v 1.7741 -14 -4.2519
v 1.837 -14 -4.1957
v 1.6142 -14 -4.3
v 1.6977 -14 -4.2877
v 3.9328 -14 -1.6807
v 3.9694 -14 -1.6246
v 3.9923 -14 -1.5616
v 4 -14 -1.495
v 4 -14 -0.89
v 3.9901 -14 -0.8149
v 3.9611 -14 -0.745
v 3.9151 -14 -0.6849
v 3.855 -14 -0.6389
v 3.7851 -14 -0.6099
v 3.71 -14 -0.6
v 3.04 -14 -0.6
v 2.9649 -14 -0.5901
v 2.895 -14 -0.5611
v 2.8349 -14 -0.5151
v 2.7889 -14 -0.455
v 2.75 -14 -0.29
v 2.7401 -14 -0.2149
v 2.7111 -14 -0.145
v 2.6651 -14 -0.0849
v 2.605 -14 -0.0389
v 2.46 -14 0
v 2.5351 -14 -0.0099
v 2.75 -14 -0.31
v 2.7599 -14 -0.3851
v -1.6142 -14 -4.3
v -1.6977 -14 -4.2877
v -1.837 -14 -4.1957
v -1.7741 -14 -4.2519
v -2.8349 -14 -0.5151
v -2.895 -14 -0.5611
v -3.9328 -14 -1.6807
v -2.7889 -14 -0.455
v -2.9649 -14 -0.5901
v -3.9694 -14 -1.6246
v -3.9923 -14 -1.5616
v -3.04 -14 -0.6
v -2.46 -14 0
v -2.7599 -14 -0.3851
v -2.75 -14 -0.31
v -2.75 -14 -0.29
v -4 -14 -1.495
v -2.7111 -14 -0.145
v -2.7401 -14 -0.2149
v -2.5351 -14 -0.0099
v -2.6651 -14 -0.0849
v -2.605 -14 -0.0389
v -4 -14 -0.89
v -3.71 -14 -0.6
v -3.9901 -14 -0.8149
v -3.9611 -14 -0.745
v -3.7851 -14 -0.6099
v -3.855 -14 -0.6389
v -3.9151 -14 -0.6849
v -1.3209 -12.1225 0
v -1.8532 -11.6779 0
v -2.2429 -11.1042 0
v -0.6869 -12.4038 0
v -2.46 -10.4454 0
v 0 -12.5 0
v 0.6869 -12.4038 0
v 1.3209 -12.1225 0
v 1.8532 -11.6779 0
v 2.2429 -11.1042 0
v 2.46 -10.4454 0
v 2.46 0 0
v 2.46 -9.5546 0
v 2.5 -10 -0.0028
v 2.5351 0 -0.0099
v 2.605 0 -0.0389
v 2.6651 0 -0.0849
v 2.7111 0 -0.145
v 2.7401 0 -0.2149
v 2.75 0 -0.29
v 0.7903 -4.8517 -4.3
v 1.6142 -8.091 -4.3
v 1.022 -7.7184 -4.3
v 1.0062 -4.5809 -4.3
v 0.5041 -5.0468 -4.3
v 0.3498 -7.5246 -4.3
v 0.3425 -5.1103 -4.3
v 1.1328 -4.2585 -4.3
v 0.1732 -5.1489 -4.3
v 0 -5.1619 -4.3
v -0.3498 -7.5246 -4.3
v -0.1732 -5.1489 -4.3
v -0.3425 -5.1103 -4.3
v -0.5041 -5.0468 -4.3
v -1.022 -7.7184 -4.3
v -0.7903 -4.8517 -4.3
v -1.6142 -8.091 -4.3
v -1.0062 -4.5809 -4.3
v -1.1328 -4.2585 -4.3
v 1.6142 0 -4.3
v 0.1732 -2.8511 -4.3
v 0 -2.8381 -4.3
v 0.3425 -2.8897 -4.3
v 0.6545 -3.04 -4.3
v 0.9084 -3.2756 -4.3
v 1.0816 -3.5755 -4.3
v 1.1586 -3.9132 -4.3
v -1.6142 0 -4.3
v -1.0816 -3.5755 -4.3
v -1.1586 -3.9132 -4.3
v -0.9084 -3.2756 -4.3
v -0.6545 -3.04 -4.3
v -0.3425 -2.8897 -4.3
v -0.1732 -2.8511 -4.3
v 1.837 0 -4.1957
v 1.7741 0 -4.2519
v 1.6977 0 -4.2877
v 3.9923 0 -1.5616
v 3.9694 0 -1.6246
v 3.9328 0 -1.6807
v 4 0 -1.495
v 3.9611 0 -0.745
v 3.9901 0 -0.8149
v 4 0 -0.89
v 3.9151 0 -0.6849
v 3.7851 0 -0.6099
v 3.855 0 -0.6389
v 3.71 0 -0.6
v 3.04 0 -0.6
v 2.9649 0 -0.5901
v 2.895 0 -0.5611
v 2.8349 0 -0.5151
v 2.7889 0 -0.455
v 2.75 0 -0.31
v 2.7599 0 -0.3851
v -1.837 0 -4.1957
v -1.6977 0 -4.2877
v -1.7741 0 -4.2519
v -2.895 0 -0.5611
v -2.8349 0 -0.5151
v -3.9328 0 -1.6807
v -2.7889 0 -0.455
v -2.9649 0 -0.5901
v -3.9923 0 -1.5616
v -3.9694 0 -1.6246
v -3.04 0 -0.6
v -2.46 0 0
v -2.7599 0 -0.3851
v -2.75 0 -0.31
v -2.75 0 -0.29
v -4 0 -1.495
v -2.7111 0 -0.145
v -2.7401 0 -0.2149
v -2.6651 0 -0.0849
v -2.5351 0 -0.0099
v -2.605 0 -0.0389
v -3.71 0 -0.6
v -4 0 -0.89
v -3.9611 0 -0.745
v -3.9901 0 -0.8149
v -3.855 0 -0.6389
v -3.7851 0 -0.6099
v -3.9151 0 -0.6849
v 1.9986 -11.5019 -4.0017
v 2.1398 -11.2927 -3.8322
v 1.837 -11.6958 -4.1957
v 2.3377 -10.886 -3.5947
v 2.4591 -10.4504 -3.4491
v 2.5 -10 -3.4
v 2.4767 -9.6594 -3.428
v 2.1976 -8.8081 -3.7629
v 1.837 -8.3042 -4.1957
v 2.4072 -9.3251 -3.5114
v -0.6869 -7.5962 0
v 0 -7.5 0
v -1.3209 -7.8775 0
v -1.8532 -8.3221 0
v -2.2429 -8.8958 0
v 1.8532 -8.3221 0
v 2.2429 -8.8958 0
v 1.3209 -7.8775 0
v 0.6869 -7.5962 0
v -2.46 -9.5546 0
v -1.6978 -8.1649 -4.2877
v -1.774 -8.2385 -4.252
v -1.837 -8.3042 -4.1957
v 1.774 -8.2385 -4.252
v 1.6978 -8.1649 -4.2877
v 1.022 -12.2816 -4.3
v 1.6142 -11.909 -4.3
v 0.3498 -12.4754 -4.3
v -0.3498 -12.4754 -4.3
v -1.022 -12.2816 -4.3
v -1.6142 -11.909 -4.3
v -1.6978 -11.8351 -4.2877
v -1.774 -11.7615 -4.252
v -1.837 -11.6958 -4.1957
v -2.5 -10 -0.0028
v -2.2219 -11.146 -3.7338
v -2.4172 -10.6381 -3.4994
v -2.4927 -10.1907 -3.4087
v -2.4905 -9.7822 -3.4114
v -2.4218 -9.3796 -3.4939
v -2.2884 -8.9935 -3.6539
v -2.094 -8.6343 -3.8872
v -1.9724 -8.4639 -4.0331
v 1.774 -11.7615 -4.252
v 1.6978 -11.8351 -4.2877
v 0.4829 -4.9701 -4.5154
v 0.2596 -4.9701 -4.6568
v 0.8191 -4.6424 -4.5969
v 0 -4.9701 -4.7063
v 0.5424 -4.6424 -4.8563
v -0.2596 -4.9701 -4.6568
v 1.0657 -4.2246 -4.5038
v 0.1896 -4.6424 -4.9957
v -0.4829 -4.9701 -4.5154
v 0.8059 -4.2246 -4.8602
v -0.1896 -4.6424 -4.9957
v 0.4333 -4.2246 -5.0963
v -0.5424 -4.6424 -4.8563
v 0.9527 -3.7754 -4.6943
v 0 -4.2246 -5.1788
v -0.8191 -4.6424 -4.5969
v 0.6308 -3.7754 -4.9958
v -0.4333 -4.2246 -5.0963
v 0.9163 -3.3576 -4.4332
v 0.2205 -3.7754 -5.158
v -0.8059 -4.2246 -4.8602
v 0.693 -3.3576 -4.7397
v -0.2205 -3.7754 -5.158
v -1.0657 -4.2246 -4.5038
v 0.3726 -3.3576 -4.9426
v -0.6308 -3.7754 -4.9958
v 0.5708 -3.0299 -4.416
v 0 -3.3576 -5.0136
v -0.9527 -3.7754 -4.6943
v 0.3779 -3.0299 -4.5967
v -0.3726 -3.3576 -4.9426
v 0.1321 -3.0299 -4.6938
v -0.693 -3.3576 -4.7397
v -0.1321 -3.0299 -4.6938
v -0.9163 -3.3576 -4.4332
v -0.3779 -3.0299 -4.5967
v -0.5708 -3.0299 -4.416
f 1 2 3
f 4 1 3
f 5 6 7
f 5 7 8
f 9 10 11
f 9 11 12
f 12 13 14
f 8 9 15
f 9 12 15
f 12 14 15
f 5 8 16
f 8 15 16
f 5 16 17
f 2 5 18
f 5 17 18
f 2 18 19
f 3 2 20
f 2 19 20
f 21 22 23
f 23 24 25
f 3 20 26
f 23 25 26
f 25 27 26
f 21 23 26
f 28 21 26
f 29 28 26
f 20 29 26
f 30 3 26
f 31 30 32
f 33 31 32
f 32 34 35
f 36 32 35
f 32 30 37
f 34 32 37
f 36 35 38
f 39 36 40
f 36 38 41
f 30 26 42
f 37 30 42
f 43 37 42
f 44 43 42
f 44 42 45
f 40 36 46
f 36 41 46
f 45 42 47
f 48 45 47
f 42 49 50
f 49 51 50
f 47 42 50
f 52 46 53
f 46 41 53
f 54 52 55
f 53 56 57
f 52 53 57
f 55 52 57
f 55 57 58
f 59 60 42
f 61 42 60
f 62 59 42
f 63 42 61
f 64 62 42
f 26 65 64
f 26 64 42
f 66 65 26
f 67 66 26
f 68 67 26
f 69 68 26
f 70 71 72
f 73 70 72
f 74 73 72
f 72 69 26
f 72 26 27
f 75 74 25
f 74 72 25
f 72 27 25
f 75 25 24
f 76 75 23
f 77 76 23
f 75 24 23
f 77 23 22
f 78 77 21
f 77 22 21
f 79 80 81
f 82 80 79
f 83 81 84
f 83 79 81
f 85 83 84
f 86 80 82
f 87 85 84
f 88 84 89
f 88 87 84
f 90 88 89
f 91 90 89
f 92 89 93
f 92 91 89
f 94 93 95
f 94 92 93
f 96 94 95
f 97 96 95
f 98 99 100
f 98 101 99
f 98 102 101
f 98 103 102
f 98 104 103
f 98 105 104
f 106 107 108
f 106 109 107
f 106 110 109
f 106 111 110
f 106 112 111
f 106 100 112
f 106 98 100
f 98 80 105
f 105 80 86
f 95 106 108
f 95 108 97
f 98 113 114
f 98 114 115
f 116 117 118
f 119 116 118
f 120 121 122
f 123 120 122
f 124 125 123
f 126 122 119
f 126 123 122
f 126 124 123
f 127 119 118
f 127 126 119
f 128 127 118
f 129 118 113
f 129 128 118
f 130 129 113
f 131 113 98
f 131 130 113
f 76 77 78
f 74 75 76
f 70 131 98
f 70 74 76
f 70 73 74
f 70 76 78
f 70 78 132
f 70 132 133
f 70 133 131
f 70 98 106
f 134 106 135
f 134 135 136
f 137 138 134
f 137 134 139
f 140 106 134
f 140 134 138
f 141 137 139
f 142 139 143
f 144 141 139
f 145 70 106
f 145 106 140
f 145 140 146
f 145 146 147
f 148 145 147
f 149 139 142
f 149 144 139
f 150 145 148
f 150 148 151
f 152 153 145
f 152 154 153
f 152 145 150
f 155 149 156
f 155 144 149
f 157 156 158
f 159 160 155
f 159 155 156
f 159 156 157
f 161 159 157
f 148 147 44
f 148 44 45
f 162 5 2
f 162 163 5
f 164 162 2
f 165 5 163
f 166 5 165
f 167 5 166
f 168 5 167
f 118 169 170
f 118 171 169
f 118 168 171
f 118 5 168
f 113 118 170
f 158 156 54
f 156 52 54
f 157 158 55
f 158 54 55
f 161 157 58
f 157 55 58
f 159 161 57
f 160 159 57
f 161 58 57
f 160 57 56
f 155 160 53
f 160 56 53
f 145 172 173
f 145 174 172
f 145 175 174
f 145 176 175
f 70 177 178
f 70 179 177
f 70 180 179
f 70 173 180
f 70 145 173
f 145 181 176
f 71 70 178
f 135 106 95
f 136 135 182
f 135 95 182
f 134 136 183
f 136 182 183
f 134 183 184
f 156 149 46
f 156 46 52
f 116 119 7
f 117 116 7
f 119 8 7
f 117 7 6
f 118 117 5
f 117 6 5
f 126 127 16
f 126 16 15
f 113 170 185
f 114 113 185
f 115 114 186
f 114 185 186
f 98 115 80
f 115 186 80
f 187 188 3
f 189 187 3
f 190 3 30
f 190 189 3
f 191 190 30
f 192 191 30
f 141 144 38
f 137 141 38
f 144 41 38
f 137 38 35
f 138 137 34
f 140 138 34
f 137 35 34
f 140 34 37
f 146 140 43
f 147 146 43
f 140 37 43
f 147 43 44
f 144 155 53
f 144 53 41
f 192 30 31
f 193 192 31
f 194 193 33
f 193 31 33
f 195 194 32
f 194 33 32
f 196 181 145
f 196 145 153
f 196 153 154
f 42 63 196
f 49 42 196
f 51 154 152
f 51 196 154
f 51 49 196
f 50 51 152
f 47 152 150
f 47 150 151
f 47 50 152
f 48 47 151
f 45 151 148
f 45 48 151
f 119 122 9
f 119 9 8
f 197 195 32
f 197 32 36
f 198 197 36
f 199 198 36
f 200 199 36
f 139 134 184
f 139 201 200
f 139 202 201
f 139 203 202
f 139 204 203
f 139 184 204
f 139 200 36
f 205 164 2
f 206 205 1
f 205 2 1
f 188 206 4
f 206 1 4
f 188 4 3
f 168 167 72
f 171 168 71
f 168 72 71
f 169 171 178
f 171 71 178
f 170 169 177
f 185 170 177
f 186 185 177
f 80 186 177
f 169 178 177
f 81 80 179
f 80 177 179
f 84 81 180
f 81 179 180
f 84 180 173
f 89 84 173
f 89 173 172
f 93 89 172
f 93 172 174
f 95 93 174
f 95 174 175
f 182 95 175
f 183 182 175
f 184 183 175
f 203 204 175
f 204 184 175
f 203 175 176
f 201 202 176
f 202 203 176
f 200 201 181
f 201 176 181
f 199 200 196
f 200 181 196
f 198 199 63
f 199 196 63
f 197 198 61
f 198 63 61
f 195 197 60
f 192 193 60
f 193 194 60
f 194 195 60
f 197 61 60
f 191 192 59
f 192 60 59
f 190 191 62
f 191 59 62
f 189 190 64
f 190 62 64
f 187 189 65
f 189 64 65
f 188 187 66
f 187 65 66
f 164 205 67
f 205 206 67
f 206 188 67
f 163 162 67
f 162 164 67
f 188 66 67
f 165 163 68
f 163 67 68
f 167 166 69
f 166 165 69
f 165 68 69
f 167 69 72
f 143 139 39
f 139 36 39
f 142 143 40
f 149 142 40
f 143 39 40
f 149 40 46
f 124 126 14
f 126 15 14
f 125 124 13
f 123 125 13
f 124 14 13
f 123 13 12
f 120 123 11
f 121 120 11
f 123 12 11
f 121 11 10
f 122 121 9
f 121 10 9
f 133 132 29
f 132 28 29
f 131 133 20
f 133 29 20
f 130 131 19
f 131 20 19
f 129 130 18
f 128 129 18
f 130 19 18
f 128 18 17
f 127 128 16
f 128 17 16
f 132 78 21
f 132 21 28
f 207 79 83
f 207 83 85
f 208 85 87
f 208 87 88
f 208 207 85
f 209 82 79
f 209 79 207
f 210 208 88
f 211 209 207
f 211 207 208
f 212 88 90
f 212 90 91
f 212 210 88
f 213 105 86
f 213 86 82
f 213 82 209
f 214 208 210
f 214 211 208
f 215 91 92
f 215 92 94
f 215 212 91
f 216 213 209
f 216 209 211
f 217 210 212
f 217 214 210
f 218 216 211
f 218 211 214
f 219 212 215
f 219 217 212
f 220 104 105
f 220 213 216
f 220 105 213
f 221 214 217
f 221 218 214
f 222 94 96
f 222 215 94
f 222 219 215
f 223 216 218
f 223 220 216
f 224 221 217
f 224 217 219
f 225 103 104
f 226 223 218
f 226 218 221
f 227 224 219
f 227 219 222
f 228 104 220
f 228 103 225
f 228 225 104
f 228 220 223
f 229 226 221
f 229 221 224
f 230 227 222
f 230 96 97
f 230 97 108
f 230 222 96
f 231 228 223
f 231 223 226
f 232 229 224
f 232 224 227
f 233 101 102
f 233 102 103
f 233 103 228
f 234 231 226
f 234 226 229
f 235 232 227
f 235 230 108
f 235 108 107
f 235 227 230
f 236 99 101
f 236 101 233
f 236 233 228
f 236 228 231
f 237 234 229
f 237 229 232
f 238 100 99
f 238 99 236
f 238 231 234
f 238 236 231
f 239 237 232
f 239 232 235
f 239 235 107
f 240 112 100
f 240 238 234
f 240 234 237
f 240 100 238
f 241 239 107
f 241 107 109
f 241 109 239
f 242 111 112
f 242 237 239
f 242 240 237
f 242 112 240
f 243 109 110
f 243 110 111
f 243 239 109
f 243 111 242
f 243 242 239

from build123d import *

# Parameters (mm, degrees)
PAD_DEPTH    = 14
FILLET_R     = 0.29
SKETCH001_R  = 2.5
POCKET_DEPTH = 4.301


with BuildPart() as part:
    # Sketch → Pad (new body)
    with BuildSketch(Plane.XZ):
        Polygon((-2.75, 0), (2.75, 0), (2.75, -0.6), (4, -0.6), (4, -1.6), (1.75, -4.3), (-1.75, -4.3), (-4, -1.6), (-4, -0.6), (-2.75, -0.6), align=None)
    extrude(amount=PAD_DEPTH)

    # Fillet
    fillet_edges = [part.edges().sort_by_distance(p)[0] for p in [
        (1.75, -7, -4.3),
        (4, -7, -1.6),
        (4, -7, -0.6),
        (-1.75, -7, -4.3),
        (-4, -7, -1.6),
        (-4, -7, -0.6),
        (2.75, -7, -0.6),
        (2.75, -7, 0),
        (-2.75, -7, -0.6),
        (-2.75, -7, 0),
    ]]
    fillet(fillet_edges, radius=FILLET_R)

    # Sketch001 → Pocket (cut, through all)
    with BuildSketch(Plane.XY):
        with Locations((0, -10)):
            Circle(SKETCH001_R)
    extrude(amount=-POCKET_DEPTH, mode=Mode.SUBTRACT)

    # Sphere → Sphere (revolve)
    with BuildSketch(Plane(origin=(0, -4, -4), x_dir=(1, 0, 0), z_dir=(0, 0, 1))):
        with BuildLine():
            ThreePointArc((0, -1.2), (1.2, 0), (0, 1.2))
            Line((0, 1.2), (0, -1.2))
        make_face()
    revolve(axis=Axis((0, -4, -4), (0, 1, 0)))


solid = part.part
